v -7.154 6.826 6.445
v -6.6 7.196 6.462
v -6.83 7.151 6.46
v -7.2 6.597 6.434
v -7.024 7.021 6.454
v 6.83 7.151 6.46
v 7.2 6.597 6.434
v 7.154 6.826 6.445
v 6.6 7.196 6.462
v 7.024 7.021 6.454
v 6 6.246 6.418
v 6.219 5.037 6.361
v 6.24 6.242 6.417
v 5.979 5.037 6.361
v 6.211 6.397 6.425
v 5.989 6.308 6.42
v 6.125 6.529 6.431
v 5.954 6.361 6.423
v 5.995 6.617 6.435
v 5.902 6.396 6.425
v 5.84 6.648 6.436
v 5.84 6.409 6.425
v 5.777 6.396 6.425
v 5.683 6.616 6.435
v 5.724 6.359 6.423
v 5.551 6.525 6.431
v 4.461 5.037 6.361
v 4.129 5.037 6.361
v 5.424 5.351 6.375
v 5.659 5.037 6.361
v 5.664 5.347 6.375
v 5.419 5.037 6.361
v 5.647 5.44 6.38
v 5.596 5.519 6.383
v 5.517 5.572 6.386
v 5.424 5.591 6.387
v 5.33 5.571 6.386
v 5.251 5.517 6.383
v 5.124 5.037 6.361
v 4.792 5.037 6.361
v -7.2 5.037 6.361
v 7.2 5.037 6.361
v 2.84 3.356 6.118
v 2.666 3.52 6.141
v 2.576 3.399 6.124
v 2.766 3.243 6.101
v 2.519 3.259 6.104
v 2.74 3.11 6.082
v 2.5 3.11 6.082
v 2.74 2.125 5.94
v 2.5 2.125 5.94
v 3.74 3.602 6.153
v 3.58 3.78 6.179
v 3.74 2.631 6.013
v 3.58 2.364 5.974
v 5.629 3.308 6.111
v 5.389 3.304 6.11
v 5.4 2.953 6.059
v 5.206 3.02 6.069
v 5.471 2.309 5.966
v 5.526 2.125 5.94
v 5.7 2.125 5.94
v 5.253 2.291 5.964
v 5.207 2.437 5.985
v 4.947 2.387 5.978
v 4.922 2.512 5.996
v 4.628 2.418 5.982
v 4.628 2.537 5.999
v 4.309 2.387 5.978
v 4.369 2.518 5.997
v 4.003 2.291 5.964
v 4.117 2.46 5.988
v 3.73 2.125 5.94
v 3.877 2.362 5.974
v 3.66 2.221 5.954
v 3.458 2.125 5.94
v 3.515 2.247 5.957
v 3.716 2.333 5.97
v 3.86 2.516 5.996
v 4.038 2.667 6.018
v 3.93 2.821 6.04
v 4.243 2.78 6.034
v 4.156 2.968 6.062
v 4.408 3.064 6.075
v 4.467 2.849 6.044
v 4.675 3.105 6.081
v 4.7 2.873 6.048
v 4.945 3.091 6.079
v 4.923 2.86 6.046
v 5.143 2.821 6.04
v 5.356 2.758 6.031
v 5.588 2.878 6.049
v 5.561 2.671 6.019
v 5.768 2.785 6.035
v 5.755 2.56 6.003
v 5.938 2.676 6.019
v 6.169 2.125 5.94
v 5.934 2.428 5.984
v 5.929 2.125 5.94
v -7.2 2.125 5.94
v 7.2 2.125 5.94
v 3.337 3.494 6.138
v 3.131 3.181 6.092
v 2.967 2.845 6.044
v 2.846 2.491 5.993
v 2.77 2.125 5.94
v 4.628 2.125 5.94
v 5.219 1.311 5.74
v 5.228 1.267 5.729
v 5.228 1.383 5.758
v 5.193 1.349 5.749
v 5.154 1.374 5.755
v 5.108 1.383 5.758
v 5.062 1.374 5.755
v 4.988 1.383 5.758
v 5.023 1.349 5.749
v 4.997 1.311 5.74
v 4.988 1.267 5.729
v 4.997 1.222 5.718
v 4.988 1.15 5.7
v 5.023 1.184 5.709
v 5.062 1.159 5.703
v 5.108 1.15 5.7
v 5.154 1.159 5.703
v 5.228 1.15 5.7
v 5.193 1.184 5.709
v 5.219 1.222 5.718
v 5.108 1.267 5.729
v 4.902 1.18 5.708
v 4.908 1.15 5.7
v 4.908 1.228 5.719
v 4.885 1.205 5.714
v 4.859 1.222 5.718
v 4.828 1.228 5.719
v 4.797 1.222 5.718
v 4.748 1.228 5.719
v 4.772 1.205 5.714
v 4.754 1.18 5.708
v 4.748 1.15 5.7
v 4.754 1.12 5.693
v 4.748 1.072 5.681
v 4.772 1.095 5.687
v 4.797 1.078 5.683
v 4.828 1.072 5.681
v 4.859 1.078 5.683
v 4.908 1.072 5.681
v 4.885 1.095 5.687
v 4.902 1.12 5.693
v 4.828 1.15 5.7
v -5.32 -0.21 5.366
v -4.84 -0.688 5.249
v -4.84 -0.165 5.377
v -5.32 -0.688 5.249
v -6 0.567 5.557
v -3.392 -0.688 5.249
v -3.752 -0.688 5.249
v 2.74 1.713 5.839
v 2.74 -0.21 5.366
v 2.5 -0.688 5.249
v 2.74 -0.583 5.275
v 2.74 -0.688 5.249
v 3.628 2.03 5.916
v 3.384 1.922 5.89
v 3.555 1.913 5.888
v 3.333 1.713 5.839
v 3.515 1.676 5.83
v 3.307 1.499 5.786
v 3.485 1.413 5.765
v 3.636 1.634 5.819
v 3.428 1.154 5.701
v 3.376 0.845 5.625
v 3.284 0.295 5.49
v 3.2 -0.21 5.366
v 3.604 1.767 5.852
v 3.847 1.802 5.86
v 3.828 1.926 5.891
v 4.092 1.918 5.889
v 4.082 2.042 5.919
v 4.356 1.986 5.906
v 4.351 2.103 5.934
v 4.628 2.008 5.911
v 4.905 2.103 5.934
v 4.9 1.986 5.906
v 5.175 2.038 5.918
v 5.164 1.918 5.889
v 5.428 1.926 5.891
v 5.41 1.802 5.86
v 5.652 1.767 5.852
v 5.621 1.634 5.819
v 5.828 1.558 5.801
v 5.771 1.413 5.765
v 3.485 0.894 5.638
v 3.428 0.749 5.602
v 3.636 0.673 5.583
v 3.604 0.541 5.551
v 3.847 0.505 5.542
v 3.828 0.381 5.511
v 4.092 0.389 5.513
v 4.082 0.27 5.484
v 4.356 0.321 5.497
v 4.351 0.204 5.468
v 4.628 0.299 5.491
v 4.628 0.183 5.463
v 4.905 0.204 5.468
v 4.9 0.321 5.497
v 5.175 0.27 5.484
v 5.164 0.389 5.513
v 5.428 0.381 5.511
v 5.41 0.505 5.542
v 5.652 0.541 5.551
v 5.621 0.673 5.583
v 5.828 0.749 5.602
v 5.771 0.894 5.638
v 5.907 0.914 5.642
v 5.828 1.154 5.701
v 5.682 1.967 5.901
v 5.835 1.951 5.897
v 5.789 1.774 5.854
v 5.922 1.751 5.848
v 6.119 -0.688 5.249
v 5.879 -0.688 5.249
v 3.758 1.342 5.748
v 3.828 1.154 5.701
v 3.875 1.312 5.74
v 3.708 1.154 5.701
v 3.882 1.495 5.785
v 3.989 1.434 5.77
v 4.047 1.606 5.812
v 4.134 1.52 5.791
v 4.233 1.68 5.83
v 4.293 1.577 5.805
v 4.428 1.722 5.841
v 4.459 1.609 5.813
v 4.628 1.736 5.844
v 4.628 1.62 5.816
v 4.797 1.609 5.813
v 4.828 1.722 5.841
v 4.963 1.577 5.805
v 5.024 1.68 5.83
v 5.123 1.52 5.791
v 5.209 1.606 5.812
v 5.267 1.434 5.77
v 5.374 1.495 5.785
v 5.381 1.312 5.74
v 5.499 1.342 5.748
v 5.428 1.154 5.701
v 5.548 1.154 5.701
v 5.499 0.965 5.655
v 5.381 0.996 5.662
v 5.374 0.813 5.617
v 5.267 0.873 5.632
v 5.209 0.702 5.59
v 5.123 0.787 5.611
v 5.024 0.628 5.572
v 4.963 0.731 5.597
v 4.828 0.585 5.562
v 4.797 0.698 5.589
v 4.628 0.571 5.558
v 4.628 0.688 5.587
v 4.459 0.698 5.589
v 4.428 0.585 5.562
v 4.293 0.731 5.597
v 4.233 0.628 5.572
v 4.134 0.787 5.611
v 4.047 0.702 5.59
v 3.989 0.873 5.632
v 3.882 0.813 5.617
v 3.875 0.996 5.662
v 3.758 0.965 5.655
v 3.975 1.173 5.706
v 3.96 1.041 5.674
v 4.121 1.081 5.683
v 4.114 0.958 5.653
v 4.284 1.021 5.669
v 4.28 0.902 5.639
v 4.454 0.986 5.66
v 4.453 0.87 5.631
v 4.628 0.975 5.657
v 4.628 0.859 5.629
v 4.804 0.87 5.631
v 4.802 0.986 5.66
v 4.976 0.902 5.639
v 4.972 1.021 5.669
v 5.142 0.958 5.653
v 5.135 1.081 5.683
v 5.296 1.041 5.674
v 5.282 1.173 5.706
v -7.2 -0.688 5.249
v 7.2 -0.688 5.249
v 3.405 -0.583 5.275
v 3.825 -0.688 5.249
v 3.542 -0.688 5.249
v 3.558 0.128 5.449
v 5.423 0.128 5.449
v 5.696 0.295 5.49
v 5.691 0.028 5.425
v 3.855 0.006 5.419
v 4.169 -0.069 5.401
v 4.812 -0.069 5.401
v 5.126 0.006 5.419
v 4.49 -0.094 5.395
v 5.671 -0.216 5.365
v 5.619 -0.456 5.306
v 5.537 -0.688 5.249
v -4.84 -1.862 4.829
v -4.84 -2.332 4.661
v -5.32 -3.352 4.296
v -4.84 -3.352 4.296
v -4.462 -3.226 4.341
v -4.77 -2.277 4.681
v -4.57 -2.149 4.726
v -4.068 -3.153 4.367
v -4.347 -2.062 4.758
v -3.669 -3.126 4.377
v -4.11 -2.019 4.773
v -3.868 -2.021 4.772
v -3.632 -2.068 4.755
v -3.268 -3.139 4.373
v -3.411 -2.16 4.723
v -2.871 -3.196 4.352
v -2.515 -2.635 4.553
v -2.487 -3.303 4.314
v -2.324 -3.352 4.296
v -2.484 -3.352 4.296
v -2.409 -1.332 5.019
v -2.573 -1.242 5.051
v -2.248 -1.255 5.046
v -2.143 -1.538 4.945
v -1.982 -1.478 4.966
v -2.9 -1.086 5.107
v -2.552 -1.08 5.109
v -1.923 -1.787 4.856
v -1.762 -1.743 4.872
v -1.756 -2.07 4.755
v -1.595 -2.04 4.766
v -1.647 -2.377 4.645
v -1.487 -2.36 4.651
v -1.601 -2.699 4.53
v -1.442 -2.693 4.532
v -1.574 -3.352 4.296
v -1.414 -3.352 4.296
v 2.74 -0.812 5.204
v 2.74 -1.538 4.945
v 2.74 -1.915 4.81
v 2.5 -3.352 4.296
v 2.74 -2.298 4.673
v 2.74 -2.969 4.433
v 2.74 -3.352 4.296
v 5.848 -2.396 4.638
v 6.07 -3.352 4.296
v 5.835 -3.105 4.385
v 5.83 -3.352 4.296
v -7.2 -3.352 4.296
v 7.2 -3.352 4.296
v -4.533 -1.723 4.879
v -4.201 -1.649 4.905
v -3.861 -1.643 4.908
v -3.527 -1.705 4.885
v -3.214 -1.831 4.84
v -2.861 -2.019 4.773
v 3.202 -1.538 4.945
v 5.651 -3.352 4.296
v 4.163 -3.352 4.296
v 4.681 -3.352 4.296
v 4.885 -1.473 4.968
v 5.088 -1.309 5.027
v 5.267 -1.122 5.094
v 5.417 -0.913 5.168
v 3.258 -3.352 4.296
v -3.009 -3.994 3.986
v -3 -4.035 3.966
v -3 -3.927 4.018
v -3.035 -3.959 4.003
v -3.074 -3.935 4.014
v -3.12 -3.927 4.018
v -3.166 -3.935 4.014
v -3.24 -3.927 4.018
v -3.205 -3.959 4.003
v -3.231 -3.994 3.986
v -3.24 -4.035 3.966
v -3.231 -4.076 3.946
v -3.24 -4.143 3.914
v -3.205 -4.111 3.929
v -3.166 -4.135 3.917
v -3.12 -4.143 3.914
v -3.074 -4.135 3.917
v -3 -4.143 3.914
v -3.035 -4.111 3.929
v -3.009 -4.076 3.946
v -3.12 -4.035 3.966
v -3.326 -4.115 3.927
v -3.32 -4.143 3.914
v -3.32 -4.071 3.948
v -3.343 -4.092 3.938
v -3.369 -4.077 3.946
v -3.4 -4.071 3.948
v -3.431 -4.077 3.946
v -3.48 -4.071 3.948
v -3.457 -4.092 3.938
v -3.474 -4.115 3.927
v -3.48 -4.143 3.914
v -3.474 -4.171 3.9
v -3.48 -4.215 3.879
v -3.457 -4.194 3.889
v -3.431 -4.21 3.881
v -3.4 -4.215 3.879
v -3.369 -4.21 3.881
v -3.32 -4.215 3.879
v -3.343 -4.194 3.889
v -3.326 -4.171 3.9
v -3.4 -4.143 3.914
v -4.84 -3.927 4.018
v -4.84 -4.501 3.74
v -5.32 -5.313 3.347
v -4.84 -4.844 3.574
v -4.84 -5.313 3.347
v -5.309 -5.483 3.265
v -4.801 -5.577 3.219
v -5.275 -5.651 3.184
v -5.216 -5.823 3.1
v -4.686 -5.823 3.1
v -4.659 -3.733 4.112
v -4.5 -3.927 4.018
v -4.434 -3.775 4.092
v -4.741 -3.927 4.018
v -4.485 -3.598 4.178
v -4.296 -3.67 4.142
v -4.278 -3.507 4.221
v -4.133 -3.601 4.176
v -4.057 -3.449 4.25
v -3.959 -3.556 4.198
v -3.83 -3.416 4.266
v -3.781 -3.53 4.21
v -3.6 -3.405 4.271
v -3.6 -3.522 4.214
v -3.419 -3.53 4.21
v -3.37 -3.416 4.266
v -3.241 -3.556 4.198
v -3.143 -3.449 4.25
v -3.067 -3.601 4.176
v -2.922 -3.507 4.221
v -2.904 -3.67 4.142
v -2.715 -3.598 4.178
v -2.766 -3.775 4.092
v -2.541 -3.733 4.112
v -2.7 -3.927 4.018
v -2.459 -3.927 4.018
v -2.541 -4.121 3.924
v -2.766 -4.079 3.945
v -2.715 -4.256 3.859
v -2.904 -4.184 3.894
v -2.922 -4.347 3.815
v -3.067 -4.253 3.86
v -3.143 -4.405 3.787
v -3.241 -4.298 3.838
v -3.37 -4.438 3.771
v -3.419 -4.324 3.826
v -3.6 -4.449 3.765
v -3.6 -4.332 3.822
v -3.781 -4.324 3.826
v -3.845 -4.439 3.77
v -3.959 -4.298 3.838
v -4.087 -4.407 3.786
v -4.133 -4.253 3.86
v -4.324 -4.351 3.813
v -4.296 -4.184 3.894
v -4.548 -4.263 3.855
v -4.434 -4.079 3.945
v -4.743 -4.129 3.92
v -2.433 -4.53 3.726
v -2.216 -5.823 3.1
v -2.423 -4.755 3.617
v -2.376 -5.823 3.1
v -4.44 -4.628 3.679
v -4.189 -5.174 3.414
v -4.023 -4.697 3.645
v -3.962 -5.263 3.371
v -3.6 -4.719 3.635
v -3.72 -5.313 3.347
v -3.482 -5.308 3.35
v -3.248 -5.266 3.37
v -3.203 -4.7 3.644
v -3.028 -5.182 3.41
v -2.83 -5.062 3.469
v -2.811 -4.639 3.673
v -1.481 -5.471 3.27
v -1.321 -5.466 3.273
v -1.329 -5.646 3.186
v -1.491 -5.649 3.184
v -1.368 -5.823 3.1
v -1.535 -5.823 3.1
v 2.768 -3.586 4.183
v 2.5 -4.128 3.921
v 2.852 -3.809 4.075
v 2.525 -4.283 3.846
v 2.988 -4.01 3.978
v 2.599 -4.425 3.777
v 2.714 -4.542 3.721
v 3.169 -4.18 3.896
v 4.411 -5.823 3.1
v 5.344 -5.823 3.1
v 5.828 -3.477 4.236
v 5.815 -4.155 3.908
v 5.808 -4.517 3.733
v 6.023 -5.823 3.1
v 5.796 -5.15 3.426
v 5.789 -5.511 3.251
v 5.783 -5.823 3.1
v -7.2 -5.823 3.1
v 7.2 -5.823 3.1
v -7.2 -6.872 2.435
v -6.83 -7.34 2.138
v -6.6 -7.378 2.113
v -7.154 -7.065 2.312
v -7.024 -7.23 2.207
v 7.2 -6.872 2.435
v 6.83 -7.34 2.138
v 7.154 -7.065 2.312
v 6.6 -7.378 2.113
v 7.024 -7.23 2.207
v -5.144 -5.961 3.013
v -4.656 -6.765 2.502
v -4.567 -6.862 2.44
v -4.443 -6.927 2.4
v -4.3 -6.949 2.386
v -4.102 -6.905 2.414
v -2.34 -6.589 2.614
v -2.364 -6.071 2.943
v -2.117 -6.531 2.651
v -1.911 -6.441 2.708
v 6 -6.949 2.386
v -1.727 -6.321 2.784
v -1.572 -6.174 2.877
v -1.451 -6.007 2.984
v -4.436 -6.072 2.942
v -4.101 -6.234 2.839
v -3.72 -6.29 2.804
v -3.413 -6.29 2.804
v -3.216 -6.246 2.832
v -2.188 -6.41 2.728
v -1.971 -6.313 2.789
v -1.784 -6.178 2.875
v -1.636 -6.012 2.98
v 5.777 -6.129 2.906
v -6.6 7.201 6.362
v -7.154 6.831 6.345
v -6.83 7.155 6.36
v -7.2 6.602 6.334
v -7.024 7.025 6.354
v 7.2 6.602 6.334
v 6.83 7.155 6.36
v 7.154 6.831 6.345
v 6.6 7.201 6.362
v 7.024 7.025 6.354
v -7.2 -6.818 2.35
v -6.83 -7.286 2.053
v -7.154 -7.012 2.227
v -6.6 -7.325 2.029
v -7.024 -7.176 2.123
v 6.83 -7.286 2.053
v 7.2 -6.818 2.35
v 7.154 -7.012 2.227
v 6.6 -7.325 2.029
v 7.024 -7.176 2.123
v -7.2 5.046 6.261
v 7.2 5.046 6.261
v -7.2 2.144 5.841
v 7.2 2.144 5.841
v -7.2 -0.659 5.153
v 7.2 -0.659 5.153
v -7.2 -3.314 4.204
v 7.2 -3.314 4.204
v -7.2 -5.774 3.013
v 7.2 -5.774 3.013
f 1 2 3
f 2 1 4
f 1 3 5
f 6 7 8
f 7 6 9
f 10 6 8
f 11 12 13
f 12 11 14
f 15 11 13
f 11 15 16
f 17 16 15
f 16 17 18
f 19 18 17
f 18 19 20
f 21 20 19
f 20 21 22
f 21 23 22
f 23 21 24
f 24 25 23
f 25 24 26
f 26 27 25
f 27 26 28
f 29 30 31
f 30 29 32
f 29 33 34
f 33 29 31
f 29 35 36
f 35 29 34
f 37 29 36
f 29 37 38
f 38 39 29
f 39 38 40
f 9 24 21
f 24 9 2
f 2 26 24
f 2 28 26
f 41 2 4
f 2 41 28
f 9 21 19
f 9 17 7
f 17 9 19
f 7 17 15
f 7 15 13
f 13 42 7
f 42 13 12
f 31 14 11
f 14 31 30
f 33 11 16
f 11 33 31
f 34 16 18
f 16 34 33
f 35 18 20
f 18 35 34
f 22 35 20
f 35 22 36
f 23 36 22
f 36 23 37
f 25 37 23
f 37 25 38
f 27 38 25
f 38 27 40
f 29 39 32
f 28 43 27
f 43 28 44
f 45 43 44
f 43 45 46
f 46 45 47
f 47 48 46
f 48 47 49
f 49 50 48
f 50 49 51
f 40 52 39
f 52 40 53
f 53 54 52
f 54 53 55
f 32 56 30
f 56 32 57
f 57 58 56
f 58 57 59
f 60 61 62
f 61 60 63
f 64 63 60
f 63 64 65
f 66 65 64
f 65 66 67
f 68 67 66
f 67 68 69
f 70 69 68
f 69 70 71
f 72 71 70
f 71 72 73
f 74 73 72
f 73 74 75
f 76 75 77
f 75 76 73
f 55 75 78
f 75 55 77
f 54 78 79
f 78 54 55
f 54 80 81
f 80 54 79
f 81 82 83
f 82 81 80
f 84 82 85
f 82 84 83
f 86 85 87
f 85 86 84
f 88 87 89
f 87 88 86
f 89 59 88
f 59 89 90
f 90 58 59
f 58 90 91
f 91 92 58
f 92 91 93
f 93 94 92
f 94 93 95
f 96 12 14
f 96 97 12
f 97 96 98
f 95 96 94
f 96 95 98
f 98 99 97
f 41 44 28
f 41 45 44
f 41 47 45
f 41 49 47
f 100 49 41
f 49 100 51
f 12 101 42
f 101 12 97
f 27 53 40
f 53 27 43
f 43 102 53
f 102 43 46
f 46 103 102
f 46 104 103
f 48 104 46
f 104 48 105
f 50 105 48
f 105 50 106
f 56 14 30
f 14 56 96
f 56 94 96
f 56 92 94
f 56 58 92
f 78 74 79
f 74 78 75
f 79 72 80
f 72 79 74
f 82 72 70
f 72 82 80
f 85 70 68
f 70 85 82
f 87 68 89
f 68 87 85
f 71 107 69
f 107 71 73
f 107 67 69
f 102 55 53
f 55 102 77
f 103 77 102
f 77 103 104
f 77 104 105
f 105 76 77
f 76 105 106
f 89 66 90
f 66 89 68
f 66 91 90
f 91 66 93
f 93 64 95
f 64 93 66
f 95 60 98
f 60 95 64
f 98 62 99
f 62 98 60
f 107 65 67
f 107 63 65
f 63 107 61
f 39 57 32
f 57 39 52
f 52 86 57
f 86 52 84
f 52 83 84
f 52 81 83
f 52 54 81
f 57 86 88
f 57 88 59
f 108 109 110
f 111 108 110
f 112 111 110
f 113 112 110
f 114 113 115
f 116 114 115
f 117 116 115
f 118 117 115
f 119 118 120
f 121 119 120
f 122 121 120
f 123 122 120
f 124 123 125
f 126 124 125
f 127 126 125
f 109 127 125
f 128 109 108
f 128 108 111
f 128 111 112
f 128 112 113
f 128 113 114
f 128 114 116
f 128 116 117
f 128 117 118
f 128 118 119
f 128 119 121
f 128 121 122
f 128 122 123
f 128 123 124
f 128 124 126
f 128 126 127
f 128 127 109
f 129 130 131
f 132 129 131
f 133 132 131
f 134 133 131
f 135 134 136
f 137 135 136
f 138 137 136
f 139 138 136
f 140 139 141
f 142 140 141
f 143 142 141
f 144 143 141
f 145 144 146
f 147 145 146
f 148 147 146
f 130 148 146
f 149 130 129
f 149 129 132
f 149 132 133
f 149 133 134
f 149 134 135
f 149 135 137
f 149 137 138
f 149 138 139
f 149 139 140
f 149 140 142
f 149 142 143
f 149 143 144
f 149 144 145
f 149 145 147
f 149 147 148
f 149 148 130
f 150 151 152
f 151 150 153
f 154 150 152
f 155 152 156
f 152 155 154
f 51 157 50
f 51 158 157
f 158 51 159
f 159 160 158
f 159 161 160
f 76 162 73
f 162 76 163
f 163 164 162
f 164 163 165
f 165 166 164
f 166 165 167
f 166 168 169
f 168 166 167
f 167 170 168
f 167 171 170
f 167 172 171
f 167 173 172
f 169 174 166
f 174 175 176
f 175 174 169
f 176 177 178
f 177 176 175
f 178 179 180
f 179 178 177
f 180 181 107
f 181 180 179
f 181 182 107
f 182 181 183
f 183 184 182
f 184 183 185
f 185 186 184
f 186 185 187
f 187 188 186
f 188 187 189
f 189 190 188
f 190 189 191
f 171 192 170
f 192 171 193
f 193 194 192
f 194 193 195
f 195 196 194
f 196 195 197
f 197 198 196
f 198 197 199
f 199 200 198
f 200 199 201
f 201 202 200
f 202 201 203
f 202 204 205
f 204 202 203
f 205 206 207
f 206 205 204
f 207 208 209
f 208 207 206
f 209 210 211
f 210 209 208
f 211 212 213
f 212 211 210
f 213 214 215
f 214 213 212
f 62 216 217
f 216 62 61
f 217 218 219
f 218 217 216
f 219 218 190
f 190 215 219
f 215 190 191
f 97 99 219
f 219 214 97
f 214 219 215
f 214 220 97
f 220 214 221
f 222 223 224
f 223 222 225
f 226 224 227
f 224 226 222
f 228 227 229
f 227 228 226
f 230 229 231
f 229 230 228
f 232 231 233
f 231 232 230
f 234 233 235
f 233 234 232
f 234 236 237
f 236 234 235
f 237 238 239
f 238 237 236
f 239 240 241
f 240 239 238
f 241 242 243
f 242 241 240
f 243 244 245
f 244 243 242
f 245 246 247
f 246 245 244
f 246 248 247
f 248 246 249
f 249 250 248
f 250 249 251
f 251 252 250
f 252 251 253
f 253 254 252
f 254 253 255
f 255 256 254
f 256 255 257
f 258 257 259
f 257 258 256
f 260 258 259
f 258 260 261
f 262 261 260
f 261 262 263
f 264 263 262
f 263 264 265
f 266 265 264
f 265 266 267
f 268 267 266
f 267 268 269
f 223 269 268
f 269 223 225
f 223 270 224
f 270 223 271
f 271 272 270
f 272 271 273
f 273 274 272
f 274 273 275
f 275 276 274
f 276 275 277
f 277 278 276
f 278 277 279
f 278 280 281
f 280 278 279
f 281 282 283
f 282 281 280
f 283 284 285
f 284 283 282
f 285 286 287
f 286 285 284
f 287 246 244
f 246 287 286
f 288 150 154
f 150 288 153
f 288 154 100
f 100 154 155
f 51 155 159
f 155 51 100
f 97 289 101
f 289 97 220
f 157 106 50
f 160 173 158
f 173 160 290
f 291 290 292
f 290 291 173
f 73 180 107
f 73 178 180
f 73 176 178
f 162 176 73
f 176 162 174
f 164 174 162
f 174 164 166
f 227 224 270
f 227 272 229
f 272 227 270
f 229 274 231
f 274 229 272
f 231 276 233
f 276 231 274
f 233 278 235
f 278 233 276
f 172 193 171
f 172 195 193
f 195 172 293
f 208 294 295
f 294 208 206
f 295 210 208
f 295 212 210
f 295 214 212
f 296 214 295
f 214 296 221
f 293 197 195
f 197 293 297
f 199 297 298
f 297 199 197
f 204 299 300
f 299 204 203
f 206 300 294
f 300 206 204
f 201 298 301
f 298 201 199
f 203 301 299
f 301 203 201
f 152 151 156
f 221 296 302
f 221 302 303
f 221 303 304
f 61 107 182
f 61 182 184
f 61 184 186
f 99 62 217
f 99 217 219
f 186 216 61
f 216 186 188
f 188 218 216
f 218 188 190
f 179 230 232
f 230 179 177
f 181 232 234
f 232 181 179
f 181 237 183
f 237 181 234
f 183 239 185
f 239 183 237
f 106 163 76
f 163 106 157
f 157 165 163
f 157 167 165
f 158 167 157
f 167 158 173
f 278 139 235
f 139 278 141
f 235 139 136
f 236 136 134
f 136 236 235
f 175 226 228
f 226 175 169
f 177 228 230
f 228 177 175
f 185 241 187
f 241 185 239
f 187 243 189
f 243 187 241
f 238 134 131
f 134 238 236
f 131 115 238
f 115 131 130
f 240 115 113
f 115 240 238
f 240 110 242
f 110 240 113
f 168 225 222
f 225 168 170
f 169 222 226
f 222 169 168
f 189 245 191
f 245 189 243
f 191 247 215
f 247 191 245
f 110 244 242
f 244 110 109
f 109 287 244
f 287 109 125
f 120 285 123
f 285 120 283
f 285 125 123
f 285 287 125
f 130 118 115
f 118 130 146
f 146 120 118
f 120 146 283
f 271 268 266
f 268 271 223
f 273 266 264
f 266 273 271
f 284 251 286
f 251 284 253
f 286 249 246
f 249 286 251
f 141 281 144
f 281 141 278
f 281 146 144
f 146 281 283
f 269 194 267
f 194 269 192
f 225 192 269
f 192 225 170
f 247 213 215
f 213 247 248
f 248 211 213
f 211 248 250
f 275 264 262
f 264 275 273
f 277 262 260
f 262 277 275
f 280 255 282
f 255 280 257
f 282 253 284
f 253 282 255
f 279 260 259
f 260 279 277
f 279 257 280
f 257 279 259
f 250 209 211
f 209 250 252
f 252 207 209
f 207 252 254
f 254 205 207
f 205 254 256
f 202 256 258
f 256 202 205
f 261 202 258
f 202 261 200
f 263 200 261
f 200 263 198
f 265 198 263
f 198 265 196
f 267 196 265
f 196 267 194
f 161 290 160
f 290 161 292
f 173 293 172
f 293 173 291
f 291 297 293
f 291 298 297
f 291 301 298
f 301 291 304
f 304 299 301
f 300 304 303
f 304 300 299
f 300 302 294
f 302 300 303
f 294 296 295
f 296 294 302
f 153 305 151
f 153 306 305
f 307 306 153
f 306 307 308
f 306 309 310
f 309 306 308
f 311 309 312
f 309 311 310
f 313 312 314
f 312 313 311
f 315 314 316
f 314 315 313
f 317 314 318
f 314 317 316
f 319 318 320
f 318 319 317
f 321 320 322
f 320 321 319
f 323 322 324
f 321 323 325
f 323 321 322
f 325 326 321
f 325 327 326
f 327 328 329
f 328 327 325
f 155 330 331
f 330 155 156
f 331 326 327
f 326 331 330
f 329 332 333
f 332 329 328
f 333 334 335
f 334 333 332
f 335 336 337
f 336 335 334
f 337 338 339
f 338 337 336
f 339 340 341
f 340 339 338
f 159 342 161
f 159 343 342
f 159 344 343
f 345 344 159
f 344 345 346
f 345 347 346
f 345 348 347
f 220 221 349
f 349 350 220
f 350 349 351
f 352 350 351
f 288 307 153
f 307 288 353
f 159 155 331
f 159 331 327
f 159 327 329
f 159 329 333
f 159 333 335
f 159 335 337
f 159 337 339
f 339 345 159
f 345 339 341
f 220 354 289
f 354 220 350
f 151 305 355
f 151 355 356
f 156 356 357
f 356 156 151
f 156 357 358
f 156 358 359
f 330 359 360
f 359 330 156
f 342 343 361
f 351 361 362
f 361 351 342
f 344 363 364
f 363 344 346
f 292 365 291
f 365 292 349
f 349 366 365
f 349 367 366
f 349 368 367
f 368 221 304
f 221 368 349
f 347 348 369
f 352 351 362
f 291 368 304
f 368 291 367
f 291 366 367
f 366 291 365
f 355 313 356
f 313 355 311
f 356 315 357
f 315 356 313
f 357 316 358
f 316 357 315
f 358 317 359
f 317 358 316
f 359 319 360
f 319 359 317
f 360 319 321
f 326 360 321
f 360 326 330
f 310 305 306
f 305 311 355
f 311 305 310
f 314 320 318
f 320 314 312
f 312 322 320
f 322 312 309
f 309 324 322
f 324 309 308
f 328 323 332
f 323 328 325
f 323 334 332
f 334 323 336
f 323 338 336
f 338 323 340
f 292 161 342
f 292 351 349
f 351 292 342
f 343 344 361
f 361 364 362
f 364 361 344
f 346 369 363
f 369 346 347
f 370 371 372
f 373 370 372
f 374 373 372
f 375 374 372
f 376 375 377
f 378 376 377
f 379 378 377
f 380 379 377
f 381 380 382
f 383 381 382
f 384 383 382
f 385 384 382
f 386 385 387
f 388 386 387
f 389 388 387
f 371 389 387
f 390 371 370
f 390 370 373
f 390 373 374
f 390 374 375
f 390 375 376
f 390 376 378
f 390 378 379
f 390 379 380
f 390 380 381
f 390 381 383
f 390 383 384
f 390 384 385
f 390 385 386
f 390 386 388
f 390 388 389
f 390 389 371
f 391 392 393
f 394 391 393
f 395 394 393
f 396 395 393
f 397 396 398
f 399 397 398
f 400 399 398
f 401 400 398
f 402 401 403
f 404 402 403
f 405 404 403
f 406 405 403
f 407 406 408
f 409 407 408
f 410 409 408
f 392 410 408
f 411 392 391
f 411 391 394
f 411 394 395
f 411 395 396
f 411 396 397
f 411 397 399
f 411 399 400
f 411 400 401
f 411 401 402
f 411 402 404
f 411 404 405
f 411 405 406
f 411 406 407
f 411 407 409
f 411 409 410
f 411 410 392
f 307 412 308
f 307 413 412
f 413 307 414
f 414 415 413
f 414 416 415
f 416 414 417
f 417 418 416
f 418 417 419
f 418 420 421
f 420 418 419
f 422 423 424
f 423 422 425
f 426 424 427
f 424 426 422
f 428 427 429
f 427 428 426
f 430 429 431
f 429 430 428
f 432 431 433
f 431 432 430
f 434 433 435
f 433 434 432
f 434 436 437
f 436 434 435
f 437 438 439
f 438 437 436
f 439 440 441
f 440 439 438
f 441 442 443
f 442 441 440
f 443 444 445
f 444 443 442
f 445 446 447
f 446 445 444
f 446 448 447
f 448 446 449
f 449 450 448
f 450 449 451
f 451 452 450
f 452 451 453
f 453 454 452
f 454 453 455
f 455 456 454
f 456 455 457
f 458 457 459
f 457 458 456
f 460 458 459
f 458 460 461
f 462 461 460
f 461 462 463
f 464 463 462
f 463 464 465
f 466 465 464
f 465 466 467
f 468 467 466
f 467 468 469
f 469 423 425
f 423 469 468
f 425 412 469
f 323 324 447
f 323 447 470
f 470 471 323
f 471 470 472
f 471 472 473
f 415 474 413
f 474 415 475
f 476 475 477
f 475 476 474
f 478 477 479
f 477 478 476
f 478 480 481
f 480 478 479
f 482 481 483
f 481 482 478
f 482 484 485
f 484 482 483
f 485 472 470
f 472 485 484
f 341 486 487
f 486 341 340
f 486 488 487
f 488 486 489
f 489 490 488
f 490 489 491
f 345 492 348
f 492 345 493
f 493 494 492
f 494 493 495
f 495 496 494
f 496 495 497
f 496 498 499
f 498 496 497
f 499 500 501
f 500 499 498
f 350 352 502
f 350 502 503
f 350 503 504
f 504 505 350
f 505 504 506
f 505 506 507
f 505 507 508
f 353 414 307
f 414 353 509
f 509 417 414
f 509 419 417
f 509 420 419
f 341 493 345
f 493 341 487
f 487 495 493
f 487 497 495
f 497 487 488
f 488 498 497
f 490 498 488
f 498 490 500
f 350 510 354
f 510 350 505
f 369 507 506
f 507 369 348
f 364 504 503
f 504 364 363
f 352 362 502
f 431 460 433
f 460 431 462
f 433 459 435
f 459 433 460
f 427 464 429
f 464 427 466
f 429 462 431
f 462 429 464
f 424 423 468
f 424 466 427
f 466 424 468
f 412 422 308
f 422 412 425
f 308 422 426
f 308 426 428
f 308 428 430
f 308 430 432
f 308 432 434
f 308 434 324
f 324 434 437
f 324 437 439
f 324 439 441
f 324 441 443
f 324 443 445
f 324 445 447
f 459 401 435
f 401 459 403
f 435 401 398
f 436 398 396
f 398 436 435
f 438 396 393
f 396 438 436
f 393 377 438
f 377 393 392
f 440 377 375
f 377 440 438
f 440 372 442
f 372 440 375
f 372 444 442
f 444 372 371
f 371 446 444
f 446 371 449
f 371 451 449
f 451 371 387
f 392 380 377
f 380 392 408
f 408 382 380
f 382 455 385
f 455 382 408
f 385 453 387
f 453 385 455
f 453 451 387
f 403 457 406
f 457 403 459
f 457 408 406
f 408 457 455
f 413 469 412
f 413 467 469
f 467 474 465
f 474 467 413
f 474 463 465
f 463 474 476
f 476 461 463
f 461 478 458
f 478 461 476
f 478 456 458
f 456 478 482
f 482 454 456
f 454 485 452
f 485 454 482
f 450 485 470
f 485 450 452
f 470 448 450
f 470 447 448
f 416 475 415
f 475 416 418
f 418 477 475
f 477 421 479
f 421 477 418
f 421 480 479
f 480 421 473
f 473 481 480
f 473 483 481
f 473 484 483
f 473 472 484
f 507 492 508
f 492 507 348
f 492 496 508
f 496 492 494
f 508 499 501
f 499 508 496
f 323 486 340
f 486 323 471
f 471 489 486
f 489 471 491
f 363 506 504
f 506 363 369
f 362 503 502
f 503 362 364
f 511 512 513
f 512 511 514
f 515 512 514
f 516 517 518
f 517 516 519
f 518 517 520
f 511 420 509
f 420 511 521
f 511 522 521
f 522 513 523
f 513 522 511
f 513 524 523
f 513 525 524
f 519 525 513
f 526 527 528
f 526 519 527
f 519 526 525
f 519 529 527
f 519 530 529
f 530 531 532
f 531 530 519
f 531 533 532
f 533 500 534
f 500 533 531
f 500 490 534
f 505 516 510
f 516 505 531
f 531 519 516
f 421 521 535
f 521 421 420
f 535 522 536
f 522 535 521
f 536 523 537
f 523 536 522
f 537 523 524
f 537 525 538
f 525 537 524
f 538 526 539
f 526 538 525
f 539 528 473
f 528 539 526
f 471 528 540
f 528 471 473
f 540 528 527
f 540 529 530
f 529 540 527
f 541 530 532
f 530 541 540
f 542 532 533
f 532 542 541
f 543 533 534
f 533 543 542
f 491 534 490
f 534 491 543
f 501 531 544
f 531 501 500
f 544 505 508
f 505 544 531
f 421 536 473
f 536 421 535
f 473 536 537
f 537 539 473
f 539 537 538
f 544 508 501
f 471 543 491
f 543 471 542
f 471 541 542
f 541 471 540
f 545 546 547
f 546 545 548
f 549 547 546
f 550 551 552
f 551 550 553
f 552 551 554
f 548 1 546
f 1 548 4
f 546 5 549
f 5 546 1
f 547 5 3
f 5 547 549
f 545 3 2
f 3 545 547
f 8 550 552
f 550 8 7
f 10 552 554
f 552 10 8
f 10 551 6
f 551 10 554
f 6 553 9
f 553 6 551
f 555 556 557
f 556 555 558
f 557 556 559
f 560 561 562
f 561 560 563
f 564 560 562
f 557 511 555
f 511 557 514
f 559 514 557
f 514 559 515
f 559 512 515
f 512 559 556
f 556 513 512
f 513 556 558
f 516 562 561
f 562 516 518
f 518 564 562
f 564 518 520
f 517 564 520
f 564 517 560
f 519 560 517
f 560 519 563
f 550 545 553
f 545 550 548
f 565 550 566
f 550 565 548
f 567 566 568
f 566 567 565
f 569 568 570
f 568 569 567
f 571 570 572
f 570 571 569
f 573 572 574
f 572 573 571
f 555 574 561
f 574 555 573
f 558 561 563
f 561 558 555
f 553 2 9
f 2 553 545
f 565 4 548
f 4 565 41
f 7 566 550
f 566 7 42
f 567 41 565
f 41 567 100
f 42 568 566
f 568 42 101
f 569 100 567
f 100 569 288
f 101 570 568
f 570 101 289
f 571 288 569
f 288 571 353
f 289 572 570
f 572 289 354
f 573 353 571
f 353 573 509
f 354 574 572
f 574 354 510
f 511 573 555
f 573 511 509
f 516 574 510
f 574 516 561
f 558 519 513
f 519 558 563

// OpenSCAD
use <../lib.scad>
use <s/6141955gs01.scad>
use <s/6141955gs02.scad>
use <s/6141955gs03.scad>
use <s/6141955gs04.scad>
use <s/6141955gs05.scad>
use <s/6141955gs06.scad>
use <s/6141955gs08.scad>
function ldraw_lib__6141955gc01() = [
// 0 Sticker  1.9 x  1.8 with Headlights on Blue Background Right (Formed)
// 0 Name: 6141955gc01.dat
// 0 Author: Massimo Maso [Sirio]
// 0 !LDRAW_ORG Part UPDATE 2025-03
// 0 !LICENSE Licensed under CC BY 4.0 : see CAreadme.txt
// 
// 0 BFC CERTIFY CCW
  [0,"BFC","CERTIFY"],
  [0,"BFC","CCW"],
// 
// 0 !KEYWORDS Bricklink 75871stk01a, Brickowl 197362, Ford, GT, Mustang
// 0 !KEYWORDS Rebrickable 24746, Set 75871, Speed Champions
// 
// 0 !HISTORY 2025-03-30 [OrionP] Official Update 2025-03
// 
// 1 16 0 -15.6524 12.616 1 0 0 0 .998894 -.047023 0 .047023 .998894 s\6141955gs01.dat
  [1,16,0,-15.6524,12.616,1,0,0,0,.998894,-.047023,0,.047023,.998894, ldraw_lib__s__6141955gs01()],
// 1 16 0 -15.6524 12.616 1 0 0 0 .989715 -.143056 0 .143056 .989715 s\6141955gs02.dat
  [1,16,0,-15.6524,12.616,1,0,0,0,.989715,-.143056,0,.143056,.989715, ldraw_lib__s__6141955gs02()],
// 1 16 0 -12.8827 -1.648 1 0 0 0 .971148 -.238478 0 .238478 .971148 s\6141955gs03.dat
  [1,16,0,-12.8827,-1.648,1,0,0,0,.971148,-.238478,0,.238478,.971148, ldraw_lib__s__6141955gs03()],
// 1 16 0 -12.8827 -1.648 1 0 0 0 .941616 -.336689 0 .336689 .941616 s\6141955gs04.dat
  [1,16,0,-12.8827,-1.648,1,0,0,0,.941616,-.336689,0,.336689,.941616, ldraw_lib__s__6141955gs04()],
// 1 16 0 -7.5316 -14.436 1 0 0 0 .900072 -.435742 0 .435742 .900072 s\6141955gs05.dat
  [1,16,0,-7.5316,-14.436,1,0,0,0,.900072,-.435742,0,.435742,.900072, ldraw_lib__s__6141955gs05()],
// 1 16 0 -7.5316 -14.436 1 0 0 0 .844289 -.535889 0 .535889 .844289 s\6141955gs06.dat
  [1,16,0,-7.5316,-14.436,1,0,0,0,.844289,-.535889,0,.535889,.844289, ldraw_lib__s__6141955gs06()],
// 1 16 0 0 0 1 0 0 0 1 0 0 0 1 s\6141955gs08.dat
  [1,16,0,0,0,1,0,0,0,1,0,0,0,1, ldraw_lib__s__6141955gs08()],
];
module ldraw_lib__6141955gc01(step=0, col=false, unit=2/5, alt=false, line=0.2, solid=!$preview)
    makepoly(ldraw_lib__6141955gc01(), step=step, col=col, unit=unit, alt=alt, line=line, solid=solid);
ldraw_lib__6141955gc01(line=0.2);
